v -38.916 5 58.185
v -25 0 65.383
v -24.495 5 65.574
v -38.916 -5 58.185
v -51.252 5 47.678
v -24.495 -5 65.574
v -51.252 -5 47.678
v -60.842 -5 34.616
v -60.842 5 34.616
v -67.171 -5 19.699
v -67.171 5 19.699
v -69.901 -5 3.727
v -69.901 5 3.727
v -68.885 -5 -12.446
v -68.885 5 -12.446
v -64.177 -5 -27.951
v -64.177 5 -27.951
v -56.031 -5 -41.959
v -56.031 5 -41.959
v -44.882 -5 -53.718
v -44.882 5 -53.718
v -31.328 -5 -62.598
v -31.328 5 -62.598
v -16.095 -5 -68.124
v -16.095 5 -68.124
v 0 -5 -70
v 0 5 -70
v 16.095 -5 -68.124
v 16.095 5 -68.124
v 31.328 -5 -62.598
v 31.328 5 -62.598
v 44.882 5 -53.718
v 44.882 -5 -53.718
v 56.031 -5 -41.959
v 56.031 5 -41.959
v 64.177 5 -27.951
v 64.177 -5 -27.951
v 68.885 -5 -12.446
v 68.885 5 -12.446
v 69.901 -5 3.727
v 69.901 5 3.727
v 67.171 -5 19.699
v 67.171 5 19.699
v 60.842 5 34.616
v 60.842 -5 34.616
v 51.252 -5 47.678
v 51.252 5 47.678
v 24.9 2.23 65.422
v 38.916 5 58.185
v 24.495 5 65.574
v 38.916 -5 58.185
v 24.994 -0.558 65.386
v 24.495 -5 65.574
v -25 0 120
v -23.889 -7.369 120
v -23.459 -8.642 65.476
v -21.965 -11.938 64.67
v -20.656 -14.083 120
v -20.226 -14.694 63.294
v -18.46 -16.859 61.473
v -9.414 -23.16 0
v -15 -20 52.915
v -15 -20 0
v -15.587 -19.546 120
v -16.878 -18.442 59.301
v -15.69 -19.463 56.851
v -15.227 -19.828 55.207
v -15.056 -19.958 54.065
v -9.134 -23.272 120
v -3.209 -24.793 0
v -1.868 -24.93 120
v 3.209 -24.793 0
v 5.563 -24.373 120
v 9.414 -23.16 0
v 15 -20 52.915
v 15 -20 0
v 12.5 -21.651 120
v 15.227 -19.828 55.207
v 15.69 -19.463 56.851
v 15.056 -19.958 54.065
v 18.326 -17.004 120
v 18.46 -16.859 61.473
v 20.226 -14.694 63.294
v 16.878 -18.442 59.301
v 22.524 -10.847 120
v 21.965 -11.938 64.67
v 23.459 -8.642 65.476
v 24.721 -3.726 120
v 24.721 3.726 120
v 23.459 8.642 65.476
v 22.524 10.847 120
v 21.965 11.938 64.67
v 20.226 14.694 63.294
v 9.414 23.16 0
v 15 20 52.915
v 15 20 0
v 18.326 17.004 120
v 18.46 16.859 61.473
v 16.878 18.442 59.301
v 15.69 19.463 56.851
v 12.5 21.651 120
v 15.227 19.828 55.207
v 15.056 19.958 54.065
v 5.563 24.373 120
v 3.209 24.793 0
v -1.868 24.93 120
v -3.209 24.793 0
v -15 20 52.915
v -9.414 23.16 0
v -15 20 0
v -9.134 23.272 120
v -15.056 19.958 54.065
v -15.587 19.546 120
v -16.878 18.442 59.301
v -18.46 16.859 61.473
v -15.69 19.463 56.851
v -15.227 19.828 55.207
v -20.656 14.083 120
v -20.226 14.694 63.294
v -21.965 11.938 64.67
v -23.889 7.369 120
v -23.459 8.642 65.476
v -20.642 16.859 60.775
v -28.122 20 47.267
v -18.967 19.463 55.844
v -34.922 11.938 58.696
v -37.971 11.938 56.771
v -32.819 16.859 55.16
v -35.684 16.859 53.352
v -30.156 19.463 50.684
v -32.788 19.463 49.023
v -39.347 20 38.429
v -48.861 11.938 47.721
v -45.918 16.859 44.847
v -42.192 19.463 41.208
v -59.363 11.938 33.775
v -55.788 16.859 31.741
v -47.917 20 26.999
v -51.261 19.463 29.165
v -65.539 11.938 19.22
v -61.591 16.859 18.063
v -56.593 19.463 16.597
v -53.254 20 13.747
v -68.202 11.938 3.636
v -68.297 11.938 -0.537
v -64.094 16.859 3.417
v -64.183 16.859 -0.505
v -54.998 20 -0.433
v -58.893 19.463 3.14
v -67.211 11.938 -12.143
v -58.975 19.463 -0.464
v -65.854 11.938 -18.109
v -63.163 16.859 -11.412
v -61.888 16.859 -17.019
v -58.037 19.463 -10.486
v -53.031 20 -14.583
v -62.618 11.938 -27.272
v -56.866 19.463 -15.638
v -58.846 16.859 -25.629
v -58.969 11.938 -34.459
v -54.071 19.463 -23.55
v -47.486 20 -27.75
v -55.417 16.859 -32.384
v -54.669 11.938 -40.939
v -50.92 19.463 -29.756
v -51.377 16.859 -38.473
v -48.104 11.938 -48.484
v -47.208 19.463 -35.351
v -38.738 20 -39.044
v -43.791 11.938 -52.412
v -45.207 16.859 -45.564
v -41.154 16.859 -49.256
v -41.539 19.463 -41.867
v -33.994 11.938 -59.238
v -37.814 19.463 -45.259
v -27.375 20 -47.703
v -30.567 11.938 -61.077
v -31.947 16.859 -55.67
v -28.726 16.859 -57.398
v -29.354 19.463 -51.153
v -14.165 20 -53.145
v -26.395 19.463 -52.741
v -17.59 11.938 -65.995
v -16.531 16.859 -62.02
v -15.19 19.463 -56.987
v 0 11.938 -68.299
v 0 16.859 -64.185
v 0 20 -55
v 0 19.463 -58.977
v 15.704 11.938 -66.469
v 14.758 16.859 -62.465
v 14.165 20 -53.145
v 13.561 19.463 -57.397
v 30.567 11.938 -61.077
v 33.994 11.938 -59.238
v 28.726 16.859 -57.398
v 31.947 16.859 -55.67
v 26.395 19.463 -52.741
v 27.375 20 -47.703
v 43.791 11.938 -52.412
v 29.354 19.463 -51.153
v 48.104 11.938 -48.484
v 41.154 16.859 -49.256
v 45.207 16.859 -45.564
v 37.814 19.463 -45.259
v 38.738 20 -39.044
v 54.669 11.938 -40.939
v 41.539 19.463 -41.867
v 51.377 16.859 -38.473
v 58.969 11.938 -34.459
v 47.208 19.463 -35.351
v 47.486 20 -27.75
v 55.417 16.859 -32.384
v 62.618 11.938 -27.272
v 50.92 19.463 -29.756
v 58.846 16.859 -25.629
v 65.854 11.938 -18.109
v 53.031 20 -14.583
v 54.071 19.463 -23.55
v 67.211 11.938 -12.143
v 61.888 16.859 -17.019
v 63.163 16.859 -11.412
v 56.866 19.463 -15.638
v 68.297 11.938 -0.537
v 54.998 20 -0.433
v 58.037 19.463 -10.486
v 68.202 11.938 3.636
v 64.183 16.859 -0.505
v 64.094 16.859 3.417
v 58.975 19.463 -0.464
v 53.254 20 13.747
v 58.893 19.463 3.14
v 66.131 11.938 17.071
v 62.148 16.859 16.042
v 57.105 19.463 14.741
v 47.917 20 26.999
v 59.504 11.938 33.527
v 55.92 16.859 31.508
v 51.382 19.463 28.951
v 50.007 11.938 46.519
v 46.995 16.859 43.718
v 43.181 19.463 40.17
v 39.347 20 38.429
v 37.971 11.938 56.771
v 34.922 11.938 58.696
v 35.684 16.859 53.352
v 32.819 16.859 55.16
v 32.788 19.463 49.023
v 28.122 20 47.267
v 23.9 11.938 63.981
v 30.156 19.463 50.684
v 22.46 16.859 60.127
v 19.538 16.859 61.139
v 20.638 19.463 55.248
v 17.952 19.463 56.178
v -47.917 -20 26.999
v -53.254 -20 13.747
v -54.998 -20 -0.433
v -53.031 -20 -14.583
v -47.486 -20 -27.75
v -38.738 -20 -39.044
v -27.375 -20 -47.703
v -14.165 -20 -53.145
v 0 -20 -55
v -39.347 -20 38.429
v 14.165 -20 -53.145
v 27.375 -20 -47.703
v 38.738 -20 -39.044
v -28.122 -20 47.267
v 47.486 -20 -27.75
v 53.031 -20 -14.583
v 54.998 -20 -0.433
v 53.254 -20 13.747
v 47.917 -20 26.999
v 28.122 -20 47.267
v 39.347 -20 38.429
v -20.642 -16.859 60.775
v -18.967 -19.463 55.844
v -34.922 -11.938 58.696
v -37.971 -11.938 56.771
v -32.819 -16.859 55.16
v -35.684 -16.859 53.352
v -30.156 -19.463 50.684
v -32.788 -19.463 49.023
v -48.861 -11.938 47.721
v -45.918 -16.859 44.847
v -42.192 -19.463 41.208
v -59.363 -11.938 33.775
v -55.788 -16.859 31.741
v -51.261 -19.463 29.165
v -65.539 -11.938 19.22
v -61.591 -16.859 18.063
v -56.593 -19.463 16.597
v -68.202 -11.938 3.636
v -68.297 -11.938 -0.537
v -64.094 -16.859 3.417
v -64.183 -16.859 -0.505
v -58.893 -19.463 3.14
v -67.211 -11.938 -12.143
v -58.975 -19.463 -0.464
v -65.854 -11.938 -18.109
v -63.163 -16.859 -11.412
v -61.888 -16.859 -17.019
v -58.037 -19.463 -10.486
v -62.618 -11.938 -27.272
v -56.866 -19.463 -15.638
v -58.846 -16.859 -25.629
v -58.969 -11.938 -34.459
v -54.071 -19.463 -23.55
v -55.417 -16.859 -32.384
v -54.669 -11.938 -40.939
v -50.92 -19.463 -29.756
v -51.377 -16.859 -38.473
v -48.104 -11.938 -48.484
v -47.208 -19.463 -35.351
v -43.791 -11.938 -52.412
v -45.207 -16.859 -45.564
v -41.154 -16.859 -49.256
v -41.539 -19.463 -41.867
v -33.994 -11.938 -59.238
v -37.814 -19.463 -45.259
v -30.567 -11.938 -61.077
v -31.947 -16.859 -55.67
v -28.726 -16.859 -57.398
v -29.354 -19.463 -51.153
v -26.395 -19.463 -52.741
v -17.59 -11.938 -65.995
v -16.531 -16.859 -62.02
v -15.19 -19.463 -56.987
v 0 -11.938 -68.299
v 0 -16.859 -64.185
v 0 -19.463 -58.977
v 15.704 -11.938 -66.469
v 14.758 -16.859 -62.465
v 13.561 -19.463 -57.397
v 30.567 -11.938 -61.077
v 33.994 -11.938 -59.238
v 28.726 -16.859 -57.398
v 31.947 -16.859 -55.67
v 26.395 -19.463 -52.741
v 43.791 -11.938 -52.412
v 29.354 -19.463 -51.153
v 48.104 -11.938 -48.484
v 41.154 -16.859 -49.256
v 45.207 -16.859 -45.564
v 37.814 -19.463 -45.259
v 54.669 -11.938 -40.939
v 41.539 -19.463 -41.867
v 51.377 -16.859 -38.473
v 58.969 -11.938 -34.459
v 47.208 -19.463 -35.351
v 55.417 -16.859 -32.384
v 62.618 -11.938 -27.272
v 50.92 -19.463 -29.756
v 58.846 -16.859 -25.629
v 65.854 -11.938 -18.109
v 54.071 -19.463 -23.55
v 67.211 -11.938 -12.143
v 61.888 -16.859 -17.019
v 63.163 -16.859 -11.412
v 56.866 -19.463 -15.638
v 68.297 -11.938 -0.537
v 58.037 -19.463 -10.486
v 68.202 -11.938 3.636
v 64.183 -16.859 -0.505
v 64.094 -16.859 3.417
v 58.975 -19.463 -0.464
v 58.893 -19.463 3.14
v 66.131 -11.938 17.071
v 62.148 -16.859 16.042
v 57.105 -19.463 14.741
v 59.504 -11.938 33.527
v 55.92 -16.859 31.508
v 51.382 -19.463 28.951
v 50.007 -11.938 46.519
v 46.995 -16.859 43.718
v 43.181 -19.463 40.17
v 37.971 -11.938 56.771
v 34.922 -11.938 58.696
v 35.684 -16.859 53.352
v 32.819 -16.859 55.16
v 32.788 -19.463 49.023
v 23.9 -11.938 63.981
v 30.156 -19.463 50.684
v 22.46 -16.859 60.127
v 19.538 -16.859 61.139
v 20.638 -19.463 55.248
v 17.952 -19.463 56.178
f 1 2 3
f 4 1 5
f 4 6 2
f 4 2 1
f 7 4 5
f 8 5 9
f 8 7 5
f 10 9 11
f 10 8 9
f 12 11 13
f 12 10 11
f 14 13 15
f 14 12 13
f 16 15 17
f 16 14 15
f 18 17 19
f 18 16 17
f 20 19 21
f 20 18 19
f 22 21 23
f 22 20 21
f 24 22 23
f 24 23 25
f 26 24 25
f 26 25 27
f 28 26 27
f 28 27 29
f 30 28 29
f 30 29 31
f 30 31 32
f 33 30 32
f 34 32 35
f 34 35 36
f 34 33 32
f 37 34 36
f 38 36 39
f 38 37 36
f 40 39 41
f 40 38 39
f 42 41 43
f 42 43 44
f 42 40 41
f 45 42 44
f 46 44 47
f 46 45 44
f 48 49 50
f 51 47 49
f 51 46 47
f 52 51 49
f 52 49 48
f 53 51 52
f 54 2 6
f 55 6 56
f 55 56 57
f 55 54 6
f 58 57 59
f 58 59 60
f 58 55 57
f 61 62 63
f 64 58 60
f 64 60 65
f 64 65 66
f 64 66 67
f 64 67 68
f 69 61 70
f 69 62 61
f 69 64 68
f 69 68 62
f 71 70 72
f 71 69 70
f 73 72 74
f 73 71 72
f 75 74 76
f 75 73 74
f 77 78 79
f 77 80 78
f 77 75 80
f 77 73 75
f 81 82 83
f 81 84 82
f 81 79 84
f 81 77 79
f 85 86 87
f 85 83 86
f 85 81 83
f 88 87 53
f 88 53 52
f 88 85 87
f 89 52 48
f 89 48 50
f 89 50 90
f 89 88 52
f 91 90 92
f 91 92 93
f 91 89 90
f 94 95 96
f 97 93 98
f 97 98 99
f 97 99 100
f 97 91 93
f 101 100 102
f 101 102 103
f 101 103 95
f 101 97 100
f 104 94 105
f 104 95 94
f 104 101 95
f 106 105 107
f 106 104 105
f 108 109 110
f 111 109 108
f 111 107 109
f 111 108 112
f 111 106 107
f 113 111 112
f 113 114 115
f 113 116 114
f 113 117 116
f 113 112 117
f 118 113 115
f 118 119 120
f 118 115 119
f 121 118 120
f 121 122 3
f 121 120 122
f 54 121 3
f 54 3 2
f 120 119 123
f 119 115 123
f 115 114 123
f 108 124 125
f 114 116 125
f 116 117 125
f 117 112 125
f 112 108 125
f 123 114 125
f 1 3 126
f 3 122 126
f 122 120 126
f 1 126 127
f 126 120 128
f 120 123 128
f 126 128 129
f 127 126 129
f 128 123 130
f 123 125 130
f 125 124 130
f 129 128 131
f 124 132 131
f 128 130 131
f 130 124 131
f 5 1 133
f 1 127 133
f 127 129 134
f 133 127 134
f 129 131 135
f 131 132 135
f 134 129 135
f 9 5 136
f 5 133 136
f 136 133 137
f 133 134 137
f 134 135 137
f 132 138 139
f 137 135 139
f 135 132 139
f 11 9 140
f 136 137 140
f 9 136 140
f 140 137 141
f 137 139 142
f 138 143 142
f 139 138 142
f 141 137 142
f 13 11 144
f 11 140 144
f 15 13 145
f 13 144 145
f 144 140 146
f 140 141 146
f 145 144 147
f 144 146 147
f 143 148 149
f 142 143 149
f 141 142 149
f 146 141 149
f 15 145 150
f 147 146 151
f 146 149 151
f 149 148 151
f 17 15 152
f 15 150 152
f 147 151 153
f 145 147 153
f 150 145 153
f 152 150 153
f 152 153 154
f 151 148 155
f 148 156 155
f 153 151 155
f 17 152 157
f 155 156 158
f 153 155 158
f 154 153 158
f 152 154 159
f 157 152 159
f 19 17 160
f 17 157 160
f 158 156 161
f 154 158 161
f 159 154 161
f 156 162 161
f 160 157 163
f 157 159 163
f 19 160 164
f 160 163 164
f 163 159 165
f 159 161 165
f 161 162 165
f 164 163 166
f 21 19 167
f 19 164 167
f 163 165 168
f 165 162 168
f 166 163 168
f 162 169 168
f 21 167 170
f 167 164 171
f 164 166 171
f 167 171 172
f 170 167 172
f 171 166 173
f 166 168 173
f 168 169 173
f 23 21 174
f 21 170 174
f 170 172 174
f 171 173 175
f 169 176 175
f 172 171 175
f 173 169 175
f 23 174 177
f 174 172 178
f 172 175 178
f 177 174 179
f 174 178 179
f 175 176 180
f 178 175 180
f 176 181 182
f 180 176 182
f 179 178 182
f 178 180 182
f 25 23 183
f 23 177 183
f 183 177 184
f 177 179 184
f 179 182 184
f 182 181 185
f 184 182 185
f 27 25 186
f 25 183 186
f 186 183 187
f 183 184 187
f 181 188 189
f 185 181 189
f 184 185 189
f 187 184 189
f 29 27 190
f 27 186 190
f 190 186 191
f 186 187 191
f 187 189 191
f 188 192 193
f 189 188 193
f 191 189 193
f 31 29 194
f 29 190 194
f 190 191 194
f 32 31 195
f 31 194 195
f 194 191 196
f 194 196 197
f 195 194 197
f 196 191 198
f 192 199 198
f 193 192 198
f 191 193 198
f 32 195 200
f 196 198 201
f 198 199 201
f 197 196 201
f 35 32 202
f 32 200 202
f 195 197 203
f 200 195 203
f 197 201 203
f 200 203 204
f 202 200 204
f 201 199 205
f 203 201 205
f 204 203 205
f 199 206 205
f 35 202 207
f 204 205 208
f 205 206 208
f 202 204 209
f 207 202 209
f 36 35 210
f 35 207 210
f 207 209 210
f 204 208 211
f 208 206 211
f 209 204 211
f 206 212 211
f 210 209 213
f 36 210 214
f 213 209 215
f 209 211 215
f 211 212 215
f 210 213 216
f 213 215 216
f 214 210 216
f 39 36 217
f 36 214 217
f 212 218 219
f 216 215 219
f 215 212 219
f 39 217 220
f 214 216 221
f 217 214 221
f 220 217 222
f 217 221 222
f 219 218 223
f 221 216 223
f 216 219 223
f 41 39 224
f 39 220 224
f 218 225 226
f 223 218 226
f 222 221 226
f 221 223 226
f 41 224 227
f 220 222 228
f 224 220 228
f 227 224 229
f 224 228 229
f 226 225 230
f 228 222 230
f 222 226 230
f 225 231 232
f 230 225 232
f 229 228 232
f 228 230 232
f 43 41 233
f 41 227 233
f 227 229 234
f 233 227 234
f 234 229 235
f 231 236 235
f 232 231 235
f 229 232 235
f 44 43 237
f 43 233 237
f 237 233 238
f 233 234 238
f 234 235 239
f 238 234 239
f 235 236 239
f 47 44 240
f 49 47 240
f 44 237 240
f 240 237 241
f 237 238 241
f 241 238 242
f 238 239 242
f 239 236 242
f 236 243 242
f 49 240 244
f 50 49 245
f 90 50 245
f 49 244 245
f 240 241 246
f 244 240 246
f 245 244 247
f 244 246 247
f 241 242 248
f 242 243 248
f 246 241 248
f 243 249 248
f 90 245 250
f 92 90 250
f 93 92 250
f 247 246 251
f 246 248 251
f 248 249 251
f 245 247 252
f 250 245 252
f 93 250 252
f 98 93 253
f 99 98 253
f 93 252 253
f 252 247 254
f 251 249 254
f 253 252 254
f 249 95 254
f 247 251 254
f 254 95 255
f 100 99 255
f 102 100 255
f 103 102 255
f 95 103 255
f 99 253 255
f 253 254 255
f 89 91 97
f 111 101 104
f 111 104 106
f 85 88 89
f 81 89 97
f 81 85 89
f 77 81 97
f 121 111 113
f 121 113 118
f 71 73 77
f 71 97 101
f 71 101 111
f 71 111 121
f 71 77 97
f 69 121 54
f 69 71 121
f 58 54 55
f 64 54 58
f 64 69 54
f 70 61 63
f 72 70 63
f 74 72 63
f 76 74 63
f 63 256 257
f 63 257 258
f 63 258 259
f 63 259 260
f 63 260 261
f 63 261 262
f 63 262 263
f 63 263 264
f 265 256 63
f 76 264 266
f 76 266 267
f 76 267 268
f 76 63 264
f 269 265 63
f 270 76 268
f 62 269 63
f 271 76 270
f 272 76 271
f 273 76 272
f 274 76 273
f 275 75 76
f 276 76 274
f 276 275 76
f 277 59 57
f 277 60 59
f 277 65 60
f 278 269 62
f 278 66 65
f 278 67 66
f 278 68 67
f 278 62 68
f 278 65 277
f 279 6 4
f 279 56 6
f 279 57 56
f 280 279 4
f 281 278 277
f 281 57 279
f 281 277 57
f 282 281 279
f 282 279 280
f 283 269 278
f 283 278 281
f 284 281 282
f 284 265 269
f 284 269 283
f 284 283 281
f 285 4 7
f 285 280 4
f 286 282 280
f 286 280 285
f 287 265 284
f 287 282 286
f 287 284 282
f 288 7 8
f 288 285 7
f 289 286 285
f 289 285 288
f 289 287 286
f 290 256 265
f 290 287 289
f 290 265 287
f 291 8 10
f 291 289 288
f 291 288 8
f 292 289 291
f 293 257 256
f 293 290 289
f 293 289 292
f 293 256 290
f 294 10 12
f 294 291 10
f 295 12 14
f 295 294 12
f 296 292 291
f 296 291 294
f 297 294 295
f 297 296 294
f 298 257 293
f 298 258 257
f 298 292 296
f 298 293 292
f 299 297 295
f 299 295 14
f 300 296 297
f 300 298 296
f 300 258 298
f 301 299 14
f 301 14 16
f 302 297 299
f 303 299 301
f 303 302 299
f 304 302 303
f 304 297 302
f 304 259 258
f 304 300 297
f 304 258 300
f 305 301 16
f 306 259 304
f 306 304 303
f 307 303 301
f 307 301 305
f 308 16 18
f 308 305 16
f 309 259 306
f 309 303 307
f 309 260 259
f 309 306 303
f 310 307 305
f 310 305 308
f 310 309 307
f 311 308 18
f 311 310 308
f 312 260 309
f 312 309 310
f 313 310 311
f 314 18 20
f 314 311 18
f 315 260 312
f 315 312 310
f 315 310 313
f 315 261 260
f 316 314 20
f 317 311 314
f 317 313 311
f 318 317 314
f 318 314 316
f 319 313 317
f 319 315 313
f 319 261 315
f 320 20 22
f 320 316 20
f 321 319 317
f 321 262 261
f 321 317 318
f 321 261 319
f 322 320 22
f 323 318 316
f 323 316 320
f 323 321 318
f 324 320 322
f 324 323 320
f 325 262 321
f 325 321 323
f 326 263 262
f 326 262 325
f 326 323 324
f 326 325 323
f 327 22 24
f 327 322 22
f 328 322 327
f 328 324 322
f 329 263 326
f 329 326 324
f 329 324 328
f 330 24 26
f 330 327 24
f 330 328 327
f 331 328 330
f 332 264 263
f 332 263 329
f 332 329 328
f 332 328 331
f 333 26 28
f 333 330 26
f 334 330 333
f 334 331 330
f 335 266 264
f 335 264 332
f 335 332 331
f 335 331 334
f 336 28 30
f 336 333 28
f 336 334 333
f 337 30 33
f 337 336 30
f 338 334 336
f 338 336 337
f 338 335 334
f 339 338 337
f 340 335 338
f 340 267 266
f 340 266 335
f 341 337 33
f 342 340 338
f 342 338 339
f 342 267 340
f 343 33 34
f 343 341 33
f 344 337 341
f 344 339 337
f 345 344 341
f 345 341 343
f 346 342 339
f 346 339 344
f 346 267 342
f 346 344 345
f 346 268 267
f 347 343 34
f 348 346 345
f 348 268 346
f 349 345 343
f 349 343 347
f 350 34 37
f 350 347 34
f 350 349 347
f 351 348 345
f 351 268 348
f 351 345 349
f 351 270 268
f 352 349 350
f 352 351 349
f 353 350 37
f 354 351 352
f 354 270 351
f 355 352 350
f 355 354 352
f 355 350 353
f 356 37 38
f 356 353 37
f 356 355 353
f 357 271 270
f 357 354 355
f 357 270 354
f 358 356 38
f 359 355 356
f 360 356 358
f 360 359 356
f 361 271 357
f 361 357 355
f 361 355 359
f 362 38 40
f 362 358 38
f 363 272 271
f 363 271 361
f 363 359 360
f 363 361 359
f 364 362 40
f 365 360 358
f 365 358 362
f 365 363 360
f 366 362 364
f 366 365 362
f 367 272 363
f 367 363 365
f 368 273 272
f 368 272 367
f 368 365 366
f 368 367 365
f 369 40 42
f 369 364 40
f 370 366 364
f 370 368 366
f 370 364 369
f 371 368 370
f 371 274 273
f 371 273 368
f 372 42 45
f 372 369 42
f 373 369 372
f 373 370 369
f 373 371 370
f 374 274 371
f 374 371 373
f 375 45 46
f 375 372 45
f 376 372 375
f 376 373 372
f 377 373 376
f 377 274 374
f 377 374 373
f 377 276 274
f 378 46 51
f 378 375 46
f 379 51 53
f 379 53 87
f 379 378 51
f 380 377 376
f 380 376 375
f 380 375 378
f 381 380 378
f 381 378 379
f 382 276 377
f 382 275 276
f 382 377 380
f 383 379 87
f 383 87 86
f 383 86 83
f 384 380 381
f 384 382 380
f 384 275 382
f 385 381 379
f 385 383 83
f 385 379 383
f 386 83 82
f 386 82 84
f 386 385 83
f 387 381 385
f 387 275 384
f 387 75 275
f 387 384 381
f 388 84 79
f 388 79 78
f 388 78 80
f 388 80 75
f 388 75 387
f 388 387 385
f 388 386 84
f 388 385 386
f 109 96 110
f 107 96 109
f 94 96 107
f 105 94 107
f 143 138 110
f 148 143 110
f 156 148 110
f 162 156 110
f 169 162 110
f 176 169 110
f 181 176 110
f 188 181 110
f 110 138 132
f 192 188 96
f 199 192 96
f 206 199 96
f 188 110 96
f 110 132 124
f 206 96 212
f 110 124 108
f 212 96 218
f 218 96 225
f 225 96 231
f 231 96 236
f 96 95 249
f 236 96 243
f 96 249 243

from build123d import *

# Parameters (mm, degrees)
F0_R     = 70
F1_DEPTH = 20
F2_R     = 15
F3_W     = 25
F3_H     = 120


with BuildPart() as f1:
    # F0 (on Front) → F1 (new body, symmetric)
    with BuildSketch(Plane.XZ):
        Circle(F0_R)
    extrude(amount=F1_DEPTH, both=True)

    # F2
    f2_edges = [f1.edges().sort_by_distance(p)[0] for p in [
        (-70, -20, 0),
        (-70, 20, 0),
    ]]
    fillet(f2_edges, radius=F2_R)

    # F3 (on Front) → F4 (revolve)
    with BuildSketch(Plane.XZ):
        with Locations((-12.5, 60)):
            Rectangle(F3_W, F3_H)
    revolve(axis=Axis((0, 0, 60), (0, 0, 1)))


solid = f1.part
